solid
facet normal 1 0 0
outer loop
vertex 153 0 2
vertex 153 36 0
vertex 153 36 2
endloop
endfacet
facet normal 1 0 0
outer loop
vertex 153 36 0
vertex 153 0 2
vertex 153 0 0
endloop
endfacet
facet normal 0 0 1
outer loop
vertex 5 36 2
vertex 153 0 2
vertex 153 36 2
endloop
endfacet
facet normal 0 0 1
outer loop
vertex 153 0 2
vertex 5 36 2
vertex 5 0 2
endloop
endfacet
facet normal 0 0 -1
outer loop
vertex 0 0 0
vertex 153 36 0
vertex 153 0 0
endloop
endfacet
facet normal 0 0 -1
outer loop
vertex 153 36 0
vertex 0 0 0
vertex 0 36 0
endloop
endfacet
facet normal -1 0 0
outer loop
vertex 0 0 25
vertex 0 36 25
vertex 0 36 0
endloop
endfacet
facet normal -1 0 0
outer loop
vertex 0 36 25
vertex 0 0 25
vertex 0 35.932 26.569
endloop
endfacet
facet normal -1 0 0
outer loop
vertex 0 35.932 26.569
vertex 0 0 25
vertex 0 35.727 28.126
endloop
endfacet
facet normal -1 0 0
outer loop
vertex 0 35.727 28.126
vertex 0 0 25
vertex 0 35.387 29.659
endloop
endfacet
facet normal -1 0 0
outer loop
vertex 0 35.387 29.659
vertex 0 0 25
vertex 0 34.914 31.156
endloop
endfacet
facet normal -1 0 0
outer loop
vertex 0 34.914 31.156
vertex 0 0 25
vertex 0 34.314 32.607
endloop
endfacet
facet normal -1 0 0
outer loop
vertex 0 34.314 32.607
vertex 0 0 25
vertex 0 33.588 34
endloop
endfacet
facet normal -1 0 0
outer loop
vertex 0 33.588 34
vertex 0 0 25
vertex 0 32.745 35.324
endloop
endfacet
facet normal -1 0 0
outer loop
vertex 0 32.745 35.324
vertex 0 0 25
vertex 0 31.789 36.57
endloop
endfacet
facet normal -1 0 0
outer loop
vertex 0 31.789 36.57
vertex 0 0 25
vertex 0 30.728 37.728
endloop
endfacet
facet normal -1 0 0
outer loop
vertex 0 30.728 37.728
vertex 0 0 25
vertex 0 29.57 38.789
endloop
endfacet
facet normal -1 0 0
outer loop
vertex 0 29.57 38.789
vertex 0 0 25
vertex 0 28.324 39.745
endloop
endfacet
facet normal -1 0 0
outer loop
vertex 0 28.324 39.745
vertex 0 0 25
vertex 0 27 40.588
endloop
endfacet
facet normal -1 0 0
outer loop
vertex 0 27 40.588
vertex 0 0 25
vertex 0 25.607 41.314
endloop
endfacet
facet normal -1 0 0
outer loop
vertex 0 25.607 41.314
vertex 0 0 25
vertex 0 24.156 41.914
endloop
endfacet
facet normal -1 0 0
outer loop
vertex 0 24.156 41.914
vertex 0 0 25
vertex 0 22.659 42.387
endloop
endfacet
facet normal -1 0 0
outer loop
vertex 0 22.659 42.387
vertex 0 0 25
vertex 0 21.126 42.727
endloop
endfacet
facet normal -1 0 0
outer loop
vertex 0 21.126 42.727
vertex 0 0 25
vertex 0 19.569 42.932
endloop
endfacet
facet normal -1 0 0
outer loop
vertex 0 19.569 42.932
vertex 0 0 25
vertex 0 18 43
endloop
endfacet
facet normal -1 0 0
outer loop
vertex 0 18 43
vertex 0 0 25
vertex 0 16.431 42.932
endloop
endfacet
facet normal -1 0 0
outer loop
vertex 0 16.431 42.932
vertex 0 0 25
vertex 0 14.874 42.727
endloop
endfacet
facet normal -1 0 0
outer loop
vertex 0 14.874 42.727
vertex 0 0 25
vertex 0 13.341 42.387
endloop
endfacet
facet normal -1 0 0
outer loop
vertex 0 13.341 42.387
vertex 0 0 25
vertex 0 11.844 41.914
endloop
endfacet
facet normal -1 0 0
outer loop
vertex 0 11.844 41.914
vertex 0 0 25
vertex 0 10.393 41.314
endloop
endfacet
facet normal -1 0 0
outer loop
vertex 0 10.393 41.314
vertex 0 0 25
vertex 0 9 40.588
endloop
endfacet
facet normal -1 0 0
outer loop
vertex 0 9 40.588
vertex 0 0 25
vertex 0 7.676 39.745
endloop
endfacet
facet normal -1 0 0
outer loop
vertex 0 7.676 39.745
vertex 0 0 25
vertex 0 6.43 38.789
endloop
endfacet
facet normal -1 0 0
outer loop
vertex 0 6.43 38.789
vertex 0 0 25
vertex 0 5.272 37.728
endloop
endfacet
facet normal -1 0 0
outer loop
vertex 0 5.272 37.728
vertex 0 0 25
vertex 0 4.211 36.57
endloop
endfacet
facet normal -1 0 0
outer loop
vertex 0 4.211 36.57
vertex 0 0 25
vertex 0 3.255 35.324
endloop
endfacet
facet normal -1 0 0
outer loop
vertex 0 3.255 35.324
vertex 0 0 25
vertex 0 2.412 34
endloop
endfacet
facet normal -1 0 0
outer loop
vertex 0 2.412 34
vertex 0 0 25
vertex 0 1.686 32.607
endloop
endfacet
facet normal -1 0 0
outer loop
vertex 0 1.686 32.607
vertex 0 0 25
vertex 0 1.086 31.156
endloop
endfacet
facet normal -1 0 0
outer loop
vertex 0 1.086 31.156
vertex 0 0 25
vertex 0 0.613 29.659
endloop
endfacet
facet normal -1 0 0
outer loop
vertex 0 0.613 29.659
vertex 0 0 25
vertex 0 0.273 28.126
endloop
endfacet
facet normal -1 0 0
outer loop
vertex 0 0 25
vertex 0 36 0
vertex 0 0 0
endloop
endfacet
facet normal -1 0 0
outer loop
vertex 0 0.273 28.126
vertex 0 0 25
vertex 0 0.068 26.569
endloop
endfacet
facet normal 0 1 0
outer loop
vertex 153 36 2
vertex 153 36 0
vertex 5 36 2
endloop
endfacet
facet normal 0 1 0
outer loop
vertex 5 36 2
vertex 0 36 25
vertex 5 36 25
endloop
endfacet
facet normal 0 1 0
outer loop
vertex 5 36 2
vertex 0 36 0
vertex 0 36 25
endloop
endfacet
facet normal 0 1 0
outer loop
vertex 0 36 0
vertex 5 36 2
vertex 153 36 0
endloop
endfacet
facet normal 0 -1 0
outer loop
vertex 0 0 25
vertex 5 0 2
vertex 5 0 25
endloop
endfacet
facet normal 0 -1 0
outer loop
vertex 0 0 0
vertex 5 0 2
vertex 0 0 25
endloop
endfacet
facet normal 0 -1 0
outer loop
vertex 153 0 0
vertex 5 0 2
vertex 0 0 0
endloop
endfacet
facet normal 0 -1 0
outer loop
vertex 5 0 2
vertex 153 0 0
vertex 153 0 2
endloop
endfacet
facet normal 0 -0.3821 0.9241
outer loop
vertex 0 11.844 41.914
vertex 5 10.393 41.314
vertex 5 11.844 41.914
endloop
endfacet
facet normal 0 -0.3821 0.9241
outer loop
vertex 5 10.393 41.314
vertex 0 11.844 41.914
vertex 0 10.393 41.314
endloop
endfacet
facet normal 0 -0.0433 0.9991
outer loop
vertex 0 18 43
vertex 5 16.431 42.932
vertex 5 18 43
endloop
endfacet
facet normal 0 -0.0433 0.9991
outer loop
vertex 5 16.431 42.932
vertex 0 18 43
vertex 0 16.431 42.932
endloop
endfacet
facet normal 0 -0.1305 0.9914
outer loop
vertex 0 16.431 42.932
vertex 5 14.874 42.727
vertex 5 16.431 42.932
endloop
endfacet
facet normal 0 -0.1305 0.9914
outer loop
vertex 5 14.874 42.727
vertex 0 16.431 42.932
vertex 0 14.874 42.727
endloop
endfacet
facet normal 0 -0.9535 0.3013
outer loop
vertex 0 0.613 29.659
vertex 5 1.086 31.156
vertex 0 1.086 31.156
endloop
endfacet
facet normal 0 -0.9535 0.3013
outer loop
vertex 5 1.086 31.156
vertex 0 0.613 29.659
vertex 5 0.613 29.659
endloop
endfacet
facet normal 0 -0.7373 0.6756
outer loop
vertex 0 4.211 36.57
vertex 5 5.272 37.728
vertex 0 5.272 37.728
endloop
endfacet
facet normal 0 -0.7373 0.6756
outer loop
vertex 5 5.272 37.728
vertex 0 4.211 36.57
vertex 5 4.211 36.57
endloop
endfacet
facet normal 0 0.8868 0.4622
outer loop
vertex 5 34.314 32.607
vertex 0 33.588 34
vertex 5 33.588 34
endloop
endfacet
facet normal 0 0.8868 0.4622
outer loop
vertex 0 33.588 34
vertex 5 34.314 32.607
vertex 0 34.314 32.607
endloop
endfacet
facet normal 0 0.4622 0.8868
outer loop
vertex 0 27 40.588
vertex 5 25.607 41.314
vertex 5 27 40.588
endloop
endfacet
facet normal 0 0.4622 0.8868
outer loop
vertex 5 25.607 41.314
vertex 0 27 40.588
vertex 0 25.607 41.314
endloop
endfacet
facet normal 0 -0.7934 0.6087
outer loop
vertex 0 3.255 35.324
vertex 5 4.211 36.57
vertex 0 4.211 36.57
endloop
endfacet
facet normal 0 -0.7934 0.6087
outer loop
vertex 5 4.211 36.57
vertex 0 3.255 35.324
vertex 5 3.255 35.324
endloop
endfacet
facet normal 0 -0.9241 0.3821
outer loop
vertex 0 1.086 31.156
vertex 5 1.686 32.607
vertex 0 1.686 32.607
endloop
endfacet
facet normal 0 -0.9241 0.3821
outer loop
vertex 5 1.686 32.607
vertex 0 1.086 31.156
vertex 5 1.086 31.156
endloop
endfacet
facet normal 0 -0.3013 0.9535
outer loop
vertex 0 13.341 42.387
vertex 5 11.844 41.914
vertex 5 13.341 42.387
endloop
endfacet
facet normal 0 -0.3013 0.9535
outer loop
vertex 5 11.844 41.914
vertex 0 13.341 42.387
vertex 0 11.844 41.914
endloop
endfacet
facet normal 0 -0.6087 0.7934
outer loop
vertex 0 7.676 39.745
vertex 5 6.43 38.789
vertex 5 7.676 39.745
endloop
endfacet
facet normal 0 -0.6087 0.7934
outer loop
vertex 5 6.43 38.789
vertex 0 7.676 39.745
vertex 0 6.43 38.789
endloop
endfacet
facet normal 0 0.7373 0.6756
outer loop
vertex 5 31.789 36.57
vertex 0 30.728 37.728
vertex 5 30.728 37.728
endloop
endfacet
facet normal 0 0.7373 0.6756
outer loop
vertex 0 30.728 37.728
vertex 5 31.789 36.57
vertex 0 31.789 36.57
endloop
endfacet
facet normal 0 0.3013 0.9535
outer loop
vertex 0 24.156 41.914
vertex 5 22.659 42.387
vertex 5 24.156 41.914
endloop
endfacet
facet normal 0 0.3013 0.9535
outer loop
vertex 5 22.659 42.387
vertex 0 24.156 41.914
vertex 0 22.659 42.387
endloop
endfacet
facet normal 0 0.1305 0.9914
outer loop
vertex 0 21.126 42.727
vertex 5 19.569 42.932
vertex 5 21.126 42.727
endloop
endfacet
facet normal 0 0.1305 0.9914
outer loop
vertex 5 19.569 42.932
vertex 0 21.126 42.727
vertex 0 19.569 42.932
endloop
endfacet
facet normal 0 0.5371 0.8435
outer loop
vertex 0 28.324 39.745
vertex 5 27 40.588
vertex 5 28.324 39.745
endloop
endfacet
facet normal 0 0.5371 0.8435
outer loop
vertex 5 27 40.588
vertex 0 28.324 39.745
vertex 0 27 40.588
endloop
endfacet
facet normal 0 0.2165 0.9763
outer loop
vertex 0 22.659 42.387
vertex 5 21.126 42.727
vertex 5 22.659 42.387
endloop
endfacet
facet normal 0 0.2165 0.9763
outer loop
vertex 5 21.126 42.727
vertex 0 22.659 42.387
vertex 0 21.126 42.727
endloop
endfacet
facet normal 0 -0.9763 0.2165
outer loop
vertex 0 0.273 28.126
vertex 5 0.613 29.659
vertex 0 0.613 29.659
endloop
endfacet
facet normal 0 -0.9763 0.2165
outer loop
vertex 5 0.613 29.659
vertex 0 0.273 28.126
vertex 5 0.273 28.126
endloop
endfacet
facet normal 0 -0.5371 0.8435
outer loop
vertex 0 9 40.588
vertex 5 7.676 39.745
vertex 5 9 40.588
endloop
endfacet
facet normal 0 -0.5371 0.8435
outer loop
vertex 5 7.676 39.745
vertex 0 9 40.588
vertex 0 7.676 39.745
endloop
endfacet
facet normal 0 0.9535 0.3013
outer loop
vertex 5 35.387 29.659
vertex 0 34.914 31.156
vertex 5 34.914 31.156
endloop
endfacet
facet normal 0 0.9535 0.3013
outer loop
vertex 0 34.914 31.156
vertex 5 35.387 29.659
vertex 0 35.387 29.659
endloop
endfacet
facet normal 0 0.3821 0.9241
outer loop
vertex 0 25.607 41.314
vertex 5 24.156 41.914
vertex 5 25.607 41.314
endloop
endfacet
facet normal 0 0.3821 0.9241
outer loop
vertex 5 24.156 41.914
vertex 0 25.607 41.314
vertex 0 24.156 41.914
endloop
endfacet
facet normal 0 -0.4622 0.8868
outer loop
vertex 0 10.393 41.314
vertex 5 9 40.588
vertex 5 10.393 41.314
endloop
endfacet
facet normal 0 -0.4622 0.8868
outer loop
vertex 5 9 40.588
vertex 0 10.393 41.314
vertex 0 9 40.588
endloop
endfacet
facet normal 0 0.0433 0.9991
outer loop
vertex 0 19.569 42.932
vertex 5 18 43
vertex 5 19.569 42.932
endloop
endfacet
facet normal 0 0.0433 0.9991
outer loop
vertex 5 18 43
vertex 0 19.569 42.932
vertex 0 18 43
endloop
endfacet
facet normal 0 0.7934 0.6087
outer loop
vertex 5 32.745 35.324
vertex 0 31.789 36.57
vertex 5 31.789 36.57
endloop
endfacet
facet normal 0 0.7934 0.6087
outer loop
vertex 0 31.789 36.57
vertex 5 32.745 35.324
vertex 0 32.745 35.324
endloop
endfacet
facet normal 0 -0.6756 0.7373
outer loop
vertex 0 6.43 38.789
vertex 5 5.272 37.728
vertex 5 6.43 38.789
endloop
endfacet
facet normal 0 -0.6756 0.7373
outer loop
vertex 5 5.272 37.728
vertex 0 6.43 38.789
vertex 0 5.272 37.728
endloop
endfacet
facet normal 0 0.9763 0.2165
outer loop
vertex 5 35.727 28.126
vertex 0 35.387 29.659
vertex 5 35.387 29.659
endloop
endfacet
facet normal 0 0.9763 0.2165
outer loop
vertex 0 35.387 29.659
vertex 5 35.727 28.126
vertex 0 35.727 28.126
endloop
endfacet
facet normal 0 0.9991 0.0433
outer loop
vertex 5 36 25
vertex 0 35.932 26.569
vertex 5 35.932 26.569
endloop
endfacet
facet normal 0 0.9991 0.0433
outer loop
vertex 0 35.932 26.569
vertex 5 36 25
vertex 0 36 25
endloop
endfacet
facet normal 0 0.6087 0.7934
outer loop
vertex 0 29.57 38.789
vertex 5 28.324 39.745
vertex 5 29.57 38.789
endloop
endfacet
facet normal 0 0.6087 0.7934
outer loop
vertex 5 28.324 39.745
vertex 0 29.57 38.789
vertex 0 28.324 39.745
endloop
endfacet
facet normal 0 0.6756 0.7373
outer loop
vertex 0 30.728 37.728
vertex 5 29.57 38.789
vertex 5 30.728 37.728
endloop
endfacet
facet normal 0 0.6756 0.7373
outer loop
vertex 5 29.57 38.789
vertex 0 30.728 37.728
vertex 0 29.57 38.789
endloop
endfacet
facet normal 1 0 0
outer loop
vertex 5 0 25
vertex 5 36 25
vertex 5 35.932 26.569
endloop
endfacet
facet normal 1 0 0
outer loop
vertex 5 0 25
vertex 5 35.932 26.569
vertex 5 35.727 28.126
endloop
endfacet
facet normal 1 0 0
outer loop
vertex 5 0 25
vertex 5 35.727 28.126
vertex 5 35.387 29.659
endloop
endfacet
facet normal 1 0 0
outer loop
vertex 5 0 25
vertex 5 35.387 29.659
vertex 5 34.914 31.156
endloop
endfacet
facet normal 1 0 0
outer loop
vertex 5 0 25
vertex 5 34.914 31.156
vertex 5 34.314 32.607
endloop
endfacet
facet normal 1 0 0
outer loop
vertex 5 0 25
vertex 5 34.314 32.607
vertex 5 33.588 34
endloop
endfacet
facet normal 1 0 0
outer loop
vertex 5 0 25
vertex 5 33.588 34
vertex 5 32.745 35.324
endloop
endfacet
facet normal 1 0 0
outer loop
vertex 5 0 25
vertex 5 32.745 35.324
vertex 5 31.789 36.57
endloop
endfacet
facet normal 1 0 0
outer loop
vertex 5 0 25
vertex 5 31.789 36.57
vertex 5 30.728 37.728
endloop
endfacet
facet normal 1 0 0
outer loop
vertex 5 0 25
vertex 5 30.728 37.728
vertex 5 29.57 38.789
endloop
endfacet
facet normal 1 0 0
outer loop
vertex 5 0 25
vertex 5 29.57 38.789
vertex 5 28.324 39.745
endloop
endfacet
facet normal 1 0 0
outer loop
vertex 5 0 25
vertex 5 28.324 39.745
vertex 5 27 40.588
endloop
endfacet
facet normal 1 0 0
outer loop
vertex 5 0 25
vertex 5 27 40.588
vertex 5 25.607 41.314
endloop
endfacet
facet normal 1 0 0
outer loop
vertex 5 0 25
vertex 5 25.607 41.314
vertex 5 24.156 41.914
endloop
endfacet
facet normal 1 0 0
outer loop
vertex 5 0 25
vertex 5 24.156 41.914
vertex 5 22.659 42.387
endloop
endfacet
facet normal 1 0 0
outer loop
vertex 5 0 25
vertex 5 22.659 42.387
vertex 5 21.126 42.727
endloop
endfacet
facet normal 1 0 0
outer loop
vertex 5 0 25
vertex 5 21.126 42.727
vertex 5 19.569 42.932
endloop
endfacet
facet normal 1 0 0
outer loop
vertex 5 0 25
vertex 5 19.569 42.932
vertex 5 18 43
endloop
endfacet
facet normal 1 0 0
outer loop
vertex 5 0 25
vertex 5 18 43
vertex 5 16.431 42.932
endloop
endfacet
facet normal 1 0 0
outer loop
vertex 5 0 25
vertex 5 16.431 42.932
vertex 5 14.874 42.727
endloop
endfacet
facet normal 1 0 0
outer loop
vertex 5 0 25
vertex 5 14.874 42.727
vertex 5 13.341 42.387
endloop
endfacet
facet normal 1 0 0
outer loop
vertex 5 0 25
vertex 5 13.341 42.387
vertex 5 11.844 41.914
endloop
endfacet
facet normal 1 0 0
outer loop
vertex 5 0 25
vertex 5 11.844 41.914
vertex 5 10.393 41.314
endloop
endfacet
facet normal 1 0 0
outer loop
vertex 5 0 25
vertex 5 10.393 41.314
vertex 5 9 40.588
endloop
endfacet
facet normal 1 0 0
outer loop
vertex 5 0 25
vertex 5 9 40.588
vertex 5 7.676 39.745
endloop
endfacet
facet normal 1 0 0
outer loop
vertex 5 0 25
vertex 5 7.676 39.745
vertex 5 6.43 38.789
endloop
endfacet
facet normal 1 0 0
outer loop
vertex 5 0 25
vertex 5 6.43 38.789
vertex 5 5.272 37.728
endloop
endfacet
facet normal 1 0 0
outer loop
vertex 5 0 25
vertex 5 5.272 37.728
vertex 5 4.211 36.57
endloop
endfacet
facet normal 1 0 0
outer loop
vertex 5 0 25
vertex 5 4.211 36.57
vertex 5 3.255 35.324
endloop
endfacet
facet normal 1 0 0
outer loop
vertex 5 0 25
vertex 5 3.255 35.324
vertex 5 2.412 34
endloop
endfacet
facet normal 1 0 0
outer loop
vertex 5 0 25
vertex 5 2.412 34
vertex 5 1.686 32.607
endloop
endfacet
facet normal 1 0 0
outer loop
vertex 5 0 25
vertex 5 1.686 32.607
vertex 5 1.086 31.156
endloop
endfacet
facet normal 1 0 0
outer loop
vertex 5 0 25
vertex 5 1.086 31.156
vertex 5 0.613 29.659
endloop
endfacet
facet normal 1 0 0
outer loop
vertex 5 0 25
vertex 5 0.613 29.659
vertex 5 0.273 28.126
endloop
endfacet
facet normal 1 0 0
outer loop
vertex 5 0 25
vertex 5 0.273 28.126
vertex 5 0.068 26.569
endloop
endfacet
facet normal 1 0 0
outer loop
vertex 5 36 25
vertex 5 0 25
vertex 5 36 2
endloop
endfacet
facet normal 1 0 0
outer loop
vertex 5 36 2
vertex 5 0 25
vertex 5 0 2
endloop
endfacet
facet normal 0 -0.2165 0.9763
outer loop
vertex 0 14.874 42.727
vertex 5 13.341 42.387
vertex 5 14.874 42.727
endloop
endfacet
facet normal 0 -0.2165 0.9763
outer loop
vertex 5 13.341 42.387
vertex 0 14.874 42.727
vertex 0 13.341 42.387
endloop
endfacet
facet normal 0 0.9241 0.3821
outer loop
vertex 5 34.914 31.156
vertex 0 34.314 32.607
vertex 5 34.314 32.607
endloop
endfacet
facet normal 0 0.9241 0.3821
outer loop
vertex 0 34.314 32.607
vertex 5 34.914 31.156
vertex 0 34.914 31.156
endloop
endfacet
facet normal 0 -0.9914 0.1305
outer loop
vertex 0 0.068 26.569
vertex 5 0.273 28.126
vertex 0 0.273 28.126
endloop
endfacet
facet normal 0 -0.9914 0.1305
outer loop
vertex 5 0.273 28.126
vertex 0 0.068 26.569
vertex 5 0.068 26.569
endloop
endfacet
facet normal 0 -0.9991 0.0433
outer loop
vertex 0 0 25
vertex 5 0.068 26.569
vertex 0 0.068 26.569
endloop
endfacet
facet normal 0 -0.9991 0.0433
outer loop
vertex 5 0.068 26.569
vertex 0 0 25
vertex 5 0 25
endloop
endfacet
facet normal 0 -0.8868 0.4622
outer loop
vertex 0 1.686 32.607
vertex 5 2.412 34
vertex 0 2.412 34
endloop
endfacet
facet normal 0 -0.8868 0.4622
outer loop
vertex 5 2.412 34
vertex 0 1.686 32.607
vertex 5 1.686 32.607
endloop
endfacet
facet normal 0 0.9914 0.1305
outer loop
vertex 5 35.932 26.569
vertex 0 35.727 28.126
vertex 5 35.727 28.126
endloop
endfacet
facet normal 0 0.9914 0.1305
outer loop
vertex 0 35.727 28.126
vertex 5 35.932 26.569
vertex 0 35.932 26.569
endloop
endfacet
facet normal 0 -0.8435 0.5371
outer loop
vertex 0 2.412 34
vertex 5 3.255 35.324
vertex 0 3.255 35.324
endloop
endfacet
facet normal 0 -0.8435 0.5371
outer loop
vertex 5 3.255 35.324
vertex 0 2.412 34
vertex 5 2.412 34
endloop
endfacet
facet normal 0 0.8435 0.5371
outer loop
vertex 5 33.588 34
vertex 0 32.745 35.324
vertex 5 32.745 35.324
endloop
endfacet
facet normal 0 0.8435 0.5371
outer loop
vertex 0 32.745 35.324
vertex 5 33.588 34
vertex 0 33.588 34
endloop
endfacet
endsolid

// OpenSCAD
// Simple clean model requested by Jason.
// Units: mm
// Shape:
//   1. One long thin rectangular plate.
//   2. At the tail, one upright tab: small rectangle + semicircle top.
//   3. No rounded corners, no holes, no fillets.

$fn = 72;

plate_length = 153;
plate_width = 36;
plate_thickness = 2;

tab_thickness = 5;       // extrusion along plate length
tab_width = 36;          // same as plate width
tab_rect_height = 23;    // rectangular lower part
tab_radius = tab_width / 2;
tab_total_height = tab_rect_height + tab_radius;

module base_plate() {
    cube([plate_length, plate_width, plate_thickness]);
}

module tab_profile_2d() {
    // Coordinates are [y, z].
    // Lower rectangle from z=0 to tab_rect_height.
    square([tab_width, tab_rect_height]);

    // Semicircle sitting on top of rectangle.
    translate([tab_width / 2, tab_rect_height])
        difference() {
            circle(r = tab_radius);
            translate([-tab_width, -tab_radius * 2])
                square([tab_width * 2, tab_radius * 2]);
        }
}

module upright_tab() {
    // Place tab at tail of plate, standing on the plate top.
    translate([0, 0, plate_thickness])
        rotate([90, 0, 90])
            linear_extrude(height = tab_thickness)
                tab_profile_2d();
}

union() {
    base_plate();
    upright_tab();
}
